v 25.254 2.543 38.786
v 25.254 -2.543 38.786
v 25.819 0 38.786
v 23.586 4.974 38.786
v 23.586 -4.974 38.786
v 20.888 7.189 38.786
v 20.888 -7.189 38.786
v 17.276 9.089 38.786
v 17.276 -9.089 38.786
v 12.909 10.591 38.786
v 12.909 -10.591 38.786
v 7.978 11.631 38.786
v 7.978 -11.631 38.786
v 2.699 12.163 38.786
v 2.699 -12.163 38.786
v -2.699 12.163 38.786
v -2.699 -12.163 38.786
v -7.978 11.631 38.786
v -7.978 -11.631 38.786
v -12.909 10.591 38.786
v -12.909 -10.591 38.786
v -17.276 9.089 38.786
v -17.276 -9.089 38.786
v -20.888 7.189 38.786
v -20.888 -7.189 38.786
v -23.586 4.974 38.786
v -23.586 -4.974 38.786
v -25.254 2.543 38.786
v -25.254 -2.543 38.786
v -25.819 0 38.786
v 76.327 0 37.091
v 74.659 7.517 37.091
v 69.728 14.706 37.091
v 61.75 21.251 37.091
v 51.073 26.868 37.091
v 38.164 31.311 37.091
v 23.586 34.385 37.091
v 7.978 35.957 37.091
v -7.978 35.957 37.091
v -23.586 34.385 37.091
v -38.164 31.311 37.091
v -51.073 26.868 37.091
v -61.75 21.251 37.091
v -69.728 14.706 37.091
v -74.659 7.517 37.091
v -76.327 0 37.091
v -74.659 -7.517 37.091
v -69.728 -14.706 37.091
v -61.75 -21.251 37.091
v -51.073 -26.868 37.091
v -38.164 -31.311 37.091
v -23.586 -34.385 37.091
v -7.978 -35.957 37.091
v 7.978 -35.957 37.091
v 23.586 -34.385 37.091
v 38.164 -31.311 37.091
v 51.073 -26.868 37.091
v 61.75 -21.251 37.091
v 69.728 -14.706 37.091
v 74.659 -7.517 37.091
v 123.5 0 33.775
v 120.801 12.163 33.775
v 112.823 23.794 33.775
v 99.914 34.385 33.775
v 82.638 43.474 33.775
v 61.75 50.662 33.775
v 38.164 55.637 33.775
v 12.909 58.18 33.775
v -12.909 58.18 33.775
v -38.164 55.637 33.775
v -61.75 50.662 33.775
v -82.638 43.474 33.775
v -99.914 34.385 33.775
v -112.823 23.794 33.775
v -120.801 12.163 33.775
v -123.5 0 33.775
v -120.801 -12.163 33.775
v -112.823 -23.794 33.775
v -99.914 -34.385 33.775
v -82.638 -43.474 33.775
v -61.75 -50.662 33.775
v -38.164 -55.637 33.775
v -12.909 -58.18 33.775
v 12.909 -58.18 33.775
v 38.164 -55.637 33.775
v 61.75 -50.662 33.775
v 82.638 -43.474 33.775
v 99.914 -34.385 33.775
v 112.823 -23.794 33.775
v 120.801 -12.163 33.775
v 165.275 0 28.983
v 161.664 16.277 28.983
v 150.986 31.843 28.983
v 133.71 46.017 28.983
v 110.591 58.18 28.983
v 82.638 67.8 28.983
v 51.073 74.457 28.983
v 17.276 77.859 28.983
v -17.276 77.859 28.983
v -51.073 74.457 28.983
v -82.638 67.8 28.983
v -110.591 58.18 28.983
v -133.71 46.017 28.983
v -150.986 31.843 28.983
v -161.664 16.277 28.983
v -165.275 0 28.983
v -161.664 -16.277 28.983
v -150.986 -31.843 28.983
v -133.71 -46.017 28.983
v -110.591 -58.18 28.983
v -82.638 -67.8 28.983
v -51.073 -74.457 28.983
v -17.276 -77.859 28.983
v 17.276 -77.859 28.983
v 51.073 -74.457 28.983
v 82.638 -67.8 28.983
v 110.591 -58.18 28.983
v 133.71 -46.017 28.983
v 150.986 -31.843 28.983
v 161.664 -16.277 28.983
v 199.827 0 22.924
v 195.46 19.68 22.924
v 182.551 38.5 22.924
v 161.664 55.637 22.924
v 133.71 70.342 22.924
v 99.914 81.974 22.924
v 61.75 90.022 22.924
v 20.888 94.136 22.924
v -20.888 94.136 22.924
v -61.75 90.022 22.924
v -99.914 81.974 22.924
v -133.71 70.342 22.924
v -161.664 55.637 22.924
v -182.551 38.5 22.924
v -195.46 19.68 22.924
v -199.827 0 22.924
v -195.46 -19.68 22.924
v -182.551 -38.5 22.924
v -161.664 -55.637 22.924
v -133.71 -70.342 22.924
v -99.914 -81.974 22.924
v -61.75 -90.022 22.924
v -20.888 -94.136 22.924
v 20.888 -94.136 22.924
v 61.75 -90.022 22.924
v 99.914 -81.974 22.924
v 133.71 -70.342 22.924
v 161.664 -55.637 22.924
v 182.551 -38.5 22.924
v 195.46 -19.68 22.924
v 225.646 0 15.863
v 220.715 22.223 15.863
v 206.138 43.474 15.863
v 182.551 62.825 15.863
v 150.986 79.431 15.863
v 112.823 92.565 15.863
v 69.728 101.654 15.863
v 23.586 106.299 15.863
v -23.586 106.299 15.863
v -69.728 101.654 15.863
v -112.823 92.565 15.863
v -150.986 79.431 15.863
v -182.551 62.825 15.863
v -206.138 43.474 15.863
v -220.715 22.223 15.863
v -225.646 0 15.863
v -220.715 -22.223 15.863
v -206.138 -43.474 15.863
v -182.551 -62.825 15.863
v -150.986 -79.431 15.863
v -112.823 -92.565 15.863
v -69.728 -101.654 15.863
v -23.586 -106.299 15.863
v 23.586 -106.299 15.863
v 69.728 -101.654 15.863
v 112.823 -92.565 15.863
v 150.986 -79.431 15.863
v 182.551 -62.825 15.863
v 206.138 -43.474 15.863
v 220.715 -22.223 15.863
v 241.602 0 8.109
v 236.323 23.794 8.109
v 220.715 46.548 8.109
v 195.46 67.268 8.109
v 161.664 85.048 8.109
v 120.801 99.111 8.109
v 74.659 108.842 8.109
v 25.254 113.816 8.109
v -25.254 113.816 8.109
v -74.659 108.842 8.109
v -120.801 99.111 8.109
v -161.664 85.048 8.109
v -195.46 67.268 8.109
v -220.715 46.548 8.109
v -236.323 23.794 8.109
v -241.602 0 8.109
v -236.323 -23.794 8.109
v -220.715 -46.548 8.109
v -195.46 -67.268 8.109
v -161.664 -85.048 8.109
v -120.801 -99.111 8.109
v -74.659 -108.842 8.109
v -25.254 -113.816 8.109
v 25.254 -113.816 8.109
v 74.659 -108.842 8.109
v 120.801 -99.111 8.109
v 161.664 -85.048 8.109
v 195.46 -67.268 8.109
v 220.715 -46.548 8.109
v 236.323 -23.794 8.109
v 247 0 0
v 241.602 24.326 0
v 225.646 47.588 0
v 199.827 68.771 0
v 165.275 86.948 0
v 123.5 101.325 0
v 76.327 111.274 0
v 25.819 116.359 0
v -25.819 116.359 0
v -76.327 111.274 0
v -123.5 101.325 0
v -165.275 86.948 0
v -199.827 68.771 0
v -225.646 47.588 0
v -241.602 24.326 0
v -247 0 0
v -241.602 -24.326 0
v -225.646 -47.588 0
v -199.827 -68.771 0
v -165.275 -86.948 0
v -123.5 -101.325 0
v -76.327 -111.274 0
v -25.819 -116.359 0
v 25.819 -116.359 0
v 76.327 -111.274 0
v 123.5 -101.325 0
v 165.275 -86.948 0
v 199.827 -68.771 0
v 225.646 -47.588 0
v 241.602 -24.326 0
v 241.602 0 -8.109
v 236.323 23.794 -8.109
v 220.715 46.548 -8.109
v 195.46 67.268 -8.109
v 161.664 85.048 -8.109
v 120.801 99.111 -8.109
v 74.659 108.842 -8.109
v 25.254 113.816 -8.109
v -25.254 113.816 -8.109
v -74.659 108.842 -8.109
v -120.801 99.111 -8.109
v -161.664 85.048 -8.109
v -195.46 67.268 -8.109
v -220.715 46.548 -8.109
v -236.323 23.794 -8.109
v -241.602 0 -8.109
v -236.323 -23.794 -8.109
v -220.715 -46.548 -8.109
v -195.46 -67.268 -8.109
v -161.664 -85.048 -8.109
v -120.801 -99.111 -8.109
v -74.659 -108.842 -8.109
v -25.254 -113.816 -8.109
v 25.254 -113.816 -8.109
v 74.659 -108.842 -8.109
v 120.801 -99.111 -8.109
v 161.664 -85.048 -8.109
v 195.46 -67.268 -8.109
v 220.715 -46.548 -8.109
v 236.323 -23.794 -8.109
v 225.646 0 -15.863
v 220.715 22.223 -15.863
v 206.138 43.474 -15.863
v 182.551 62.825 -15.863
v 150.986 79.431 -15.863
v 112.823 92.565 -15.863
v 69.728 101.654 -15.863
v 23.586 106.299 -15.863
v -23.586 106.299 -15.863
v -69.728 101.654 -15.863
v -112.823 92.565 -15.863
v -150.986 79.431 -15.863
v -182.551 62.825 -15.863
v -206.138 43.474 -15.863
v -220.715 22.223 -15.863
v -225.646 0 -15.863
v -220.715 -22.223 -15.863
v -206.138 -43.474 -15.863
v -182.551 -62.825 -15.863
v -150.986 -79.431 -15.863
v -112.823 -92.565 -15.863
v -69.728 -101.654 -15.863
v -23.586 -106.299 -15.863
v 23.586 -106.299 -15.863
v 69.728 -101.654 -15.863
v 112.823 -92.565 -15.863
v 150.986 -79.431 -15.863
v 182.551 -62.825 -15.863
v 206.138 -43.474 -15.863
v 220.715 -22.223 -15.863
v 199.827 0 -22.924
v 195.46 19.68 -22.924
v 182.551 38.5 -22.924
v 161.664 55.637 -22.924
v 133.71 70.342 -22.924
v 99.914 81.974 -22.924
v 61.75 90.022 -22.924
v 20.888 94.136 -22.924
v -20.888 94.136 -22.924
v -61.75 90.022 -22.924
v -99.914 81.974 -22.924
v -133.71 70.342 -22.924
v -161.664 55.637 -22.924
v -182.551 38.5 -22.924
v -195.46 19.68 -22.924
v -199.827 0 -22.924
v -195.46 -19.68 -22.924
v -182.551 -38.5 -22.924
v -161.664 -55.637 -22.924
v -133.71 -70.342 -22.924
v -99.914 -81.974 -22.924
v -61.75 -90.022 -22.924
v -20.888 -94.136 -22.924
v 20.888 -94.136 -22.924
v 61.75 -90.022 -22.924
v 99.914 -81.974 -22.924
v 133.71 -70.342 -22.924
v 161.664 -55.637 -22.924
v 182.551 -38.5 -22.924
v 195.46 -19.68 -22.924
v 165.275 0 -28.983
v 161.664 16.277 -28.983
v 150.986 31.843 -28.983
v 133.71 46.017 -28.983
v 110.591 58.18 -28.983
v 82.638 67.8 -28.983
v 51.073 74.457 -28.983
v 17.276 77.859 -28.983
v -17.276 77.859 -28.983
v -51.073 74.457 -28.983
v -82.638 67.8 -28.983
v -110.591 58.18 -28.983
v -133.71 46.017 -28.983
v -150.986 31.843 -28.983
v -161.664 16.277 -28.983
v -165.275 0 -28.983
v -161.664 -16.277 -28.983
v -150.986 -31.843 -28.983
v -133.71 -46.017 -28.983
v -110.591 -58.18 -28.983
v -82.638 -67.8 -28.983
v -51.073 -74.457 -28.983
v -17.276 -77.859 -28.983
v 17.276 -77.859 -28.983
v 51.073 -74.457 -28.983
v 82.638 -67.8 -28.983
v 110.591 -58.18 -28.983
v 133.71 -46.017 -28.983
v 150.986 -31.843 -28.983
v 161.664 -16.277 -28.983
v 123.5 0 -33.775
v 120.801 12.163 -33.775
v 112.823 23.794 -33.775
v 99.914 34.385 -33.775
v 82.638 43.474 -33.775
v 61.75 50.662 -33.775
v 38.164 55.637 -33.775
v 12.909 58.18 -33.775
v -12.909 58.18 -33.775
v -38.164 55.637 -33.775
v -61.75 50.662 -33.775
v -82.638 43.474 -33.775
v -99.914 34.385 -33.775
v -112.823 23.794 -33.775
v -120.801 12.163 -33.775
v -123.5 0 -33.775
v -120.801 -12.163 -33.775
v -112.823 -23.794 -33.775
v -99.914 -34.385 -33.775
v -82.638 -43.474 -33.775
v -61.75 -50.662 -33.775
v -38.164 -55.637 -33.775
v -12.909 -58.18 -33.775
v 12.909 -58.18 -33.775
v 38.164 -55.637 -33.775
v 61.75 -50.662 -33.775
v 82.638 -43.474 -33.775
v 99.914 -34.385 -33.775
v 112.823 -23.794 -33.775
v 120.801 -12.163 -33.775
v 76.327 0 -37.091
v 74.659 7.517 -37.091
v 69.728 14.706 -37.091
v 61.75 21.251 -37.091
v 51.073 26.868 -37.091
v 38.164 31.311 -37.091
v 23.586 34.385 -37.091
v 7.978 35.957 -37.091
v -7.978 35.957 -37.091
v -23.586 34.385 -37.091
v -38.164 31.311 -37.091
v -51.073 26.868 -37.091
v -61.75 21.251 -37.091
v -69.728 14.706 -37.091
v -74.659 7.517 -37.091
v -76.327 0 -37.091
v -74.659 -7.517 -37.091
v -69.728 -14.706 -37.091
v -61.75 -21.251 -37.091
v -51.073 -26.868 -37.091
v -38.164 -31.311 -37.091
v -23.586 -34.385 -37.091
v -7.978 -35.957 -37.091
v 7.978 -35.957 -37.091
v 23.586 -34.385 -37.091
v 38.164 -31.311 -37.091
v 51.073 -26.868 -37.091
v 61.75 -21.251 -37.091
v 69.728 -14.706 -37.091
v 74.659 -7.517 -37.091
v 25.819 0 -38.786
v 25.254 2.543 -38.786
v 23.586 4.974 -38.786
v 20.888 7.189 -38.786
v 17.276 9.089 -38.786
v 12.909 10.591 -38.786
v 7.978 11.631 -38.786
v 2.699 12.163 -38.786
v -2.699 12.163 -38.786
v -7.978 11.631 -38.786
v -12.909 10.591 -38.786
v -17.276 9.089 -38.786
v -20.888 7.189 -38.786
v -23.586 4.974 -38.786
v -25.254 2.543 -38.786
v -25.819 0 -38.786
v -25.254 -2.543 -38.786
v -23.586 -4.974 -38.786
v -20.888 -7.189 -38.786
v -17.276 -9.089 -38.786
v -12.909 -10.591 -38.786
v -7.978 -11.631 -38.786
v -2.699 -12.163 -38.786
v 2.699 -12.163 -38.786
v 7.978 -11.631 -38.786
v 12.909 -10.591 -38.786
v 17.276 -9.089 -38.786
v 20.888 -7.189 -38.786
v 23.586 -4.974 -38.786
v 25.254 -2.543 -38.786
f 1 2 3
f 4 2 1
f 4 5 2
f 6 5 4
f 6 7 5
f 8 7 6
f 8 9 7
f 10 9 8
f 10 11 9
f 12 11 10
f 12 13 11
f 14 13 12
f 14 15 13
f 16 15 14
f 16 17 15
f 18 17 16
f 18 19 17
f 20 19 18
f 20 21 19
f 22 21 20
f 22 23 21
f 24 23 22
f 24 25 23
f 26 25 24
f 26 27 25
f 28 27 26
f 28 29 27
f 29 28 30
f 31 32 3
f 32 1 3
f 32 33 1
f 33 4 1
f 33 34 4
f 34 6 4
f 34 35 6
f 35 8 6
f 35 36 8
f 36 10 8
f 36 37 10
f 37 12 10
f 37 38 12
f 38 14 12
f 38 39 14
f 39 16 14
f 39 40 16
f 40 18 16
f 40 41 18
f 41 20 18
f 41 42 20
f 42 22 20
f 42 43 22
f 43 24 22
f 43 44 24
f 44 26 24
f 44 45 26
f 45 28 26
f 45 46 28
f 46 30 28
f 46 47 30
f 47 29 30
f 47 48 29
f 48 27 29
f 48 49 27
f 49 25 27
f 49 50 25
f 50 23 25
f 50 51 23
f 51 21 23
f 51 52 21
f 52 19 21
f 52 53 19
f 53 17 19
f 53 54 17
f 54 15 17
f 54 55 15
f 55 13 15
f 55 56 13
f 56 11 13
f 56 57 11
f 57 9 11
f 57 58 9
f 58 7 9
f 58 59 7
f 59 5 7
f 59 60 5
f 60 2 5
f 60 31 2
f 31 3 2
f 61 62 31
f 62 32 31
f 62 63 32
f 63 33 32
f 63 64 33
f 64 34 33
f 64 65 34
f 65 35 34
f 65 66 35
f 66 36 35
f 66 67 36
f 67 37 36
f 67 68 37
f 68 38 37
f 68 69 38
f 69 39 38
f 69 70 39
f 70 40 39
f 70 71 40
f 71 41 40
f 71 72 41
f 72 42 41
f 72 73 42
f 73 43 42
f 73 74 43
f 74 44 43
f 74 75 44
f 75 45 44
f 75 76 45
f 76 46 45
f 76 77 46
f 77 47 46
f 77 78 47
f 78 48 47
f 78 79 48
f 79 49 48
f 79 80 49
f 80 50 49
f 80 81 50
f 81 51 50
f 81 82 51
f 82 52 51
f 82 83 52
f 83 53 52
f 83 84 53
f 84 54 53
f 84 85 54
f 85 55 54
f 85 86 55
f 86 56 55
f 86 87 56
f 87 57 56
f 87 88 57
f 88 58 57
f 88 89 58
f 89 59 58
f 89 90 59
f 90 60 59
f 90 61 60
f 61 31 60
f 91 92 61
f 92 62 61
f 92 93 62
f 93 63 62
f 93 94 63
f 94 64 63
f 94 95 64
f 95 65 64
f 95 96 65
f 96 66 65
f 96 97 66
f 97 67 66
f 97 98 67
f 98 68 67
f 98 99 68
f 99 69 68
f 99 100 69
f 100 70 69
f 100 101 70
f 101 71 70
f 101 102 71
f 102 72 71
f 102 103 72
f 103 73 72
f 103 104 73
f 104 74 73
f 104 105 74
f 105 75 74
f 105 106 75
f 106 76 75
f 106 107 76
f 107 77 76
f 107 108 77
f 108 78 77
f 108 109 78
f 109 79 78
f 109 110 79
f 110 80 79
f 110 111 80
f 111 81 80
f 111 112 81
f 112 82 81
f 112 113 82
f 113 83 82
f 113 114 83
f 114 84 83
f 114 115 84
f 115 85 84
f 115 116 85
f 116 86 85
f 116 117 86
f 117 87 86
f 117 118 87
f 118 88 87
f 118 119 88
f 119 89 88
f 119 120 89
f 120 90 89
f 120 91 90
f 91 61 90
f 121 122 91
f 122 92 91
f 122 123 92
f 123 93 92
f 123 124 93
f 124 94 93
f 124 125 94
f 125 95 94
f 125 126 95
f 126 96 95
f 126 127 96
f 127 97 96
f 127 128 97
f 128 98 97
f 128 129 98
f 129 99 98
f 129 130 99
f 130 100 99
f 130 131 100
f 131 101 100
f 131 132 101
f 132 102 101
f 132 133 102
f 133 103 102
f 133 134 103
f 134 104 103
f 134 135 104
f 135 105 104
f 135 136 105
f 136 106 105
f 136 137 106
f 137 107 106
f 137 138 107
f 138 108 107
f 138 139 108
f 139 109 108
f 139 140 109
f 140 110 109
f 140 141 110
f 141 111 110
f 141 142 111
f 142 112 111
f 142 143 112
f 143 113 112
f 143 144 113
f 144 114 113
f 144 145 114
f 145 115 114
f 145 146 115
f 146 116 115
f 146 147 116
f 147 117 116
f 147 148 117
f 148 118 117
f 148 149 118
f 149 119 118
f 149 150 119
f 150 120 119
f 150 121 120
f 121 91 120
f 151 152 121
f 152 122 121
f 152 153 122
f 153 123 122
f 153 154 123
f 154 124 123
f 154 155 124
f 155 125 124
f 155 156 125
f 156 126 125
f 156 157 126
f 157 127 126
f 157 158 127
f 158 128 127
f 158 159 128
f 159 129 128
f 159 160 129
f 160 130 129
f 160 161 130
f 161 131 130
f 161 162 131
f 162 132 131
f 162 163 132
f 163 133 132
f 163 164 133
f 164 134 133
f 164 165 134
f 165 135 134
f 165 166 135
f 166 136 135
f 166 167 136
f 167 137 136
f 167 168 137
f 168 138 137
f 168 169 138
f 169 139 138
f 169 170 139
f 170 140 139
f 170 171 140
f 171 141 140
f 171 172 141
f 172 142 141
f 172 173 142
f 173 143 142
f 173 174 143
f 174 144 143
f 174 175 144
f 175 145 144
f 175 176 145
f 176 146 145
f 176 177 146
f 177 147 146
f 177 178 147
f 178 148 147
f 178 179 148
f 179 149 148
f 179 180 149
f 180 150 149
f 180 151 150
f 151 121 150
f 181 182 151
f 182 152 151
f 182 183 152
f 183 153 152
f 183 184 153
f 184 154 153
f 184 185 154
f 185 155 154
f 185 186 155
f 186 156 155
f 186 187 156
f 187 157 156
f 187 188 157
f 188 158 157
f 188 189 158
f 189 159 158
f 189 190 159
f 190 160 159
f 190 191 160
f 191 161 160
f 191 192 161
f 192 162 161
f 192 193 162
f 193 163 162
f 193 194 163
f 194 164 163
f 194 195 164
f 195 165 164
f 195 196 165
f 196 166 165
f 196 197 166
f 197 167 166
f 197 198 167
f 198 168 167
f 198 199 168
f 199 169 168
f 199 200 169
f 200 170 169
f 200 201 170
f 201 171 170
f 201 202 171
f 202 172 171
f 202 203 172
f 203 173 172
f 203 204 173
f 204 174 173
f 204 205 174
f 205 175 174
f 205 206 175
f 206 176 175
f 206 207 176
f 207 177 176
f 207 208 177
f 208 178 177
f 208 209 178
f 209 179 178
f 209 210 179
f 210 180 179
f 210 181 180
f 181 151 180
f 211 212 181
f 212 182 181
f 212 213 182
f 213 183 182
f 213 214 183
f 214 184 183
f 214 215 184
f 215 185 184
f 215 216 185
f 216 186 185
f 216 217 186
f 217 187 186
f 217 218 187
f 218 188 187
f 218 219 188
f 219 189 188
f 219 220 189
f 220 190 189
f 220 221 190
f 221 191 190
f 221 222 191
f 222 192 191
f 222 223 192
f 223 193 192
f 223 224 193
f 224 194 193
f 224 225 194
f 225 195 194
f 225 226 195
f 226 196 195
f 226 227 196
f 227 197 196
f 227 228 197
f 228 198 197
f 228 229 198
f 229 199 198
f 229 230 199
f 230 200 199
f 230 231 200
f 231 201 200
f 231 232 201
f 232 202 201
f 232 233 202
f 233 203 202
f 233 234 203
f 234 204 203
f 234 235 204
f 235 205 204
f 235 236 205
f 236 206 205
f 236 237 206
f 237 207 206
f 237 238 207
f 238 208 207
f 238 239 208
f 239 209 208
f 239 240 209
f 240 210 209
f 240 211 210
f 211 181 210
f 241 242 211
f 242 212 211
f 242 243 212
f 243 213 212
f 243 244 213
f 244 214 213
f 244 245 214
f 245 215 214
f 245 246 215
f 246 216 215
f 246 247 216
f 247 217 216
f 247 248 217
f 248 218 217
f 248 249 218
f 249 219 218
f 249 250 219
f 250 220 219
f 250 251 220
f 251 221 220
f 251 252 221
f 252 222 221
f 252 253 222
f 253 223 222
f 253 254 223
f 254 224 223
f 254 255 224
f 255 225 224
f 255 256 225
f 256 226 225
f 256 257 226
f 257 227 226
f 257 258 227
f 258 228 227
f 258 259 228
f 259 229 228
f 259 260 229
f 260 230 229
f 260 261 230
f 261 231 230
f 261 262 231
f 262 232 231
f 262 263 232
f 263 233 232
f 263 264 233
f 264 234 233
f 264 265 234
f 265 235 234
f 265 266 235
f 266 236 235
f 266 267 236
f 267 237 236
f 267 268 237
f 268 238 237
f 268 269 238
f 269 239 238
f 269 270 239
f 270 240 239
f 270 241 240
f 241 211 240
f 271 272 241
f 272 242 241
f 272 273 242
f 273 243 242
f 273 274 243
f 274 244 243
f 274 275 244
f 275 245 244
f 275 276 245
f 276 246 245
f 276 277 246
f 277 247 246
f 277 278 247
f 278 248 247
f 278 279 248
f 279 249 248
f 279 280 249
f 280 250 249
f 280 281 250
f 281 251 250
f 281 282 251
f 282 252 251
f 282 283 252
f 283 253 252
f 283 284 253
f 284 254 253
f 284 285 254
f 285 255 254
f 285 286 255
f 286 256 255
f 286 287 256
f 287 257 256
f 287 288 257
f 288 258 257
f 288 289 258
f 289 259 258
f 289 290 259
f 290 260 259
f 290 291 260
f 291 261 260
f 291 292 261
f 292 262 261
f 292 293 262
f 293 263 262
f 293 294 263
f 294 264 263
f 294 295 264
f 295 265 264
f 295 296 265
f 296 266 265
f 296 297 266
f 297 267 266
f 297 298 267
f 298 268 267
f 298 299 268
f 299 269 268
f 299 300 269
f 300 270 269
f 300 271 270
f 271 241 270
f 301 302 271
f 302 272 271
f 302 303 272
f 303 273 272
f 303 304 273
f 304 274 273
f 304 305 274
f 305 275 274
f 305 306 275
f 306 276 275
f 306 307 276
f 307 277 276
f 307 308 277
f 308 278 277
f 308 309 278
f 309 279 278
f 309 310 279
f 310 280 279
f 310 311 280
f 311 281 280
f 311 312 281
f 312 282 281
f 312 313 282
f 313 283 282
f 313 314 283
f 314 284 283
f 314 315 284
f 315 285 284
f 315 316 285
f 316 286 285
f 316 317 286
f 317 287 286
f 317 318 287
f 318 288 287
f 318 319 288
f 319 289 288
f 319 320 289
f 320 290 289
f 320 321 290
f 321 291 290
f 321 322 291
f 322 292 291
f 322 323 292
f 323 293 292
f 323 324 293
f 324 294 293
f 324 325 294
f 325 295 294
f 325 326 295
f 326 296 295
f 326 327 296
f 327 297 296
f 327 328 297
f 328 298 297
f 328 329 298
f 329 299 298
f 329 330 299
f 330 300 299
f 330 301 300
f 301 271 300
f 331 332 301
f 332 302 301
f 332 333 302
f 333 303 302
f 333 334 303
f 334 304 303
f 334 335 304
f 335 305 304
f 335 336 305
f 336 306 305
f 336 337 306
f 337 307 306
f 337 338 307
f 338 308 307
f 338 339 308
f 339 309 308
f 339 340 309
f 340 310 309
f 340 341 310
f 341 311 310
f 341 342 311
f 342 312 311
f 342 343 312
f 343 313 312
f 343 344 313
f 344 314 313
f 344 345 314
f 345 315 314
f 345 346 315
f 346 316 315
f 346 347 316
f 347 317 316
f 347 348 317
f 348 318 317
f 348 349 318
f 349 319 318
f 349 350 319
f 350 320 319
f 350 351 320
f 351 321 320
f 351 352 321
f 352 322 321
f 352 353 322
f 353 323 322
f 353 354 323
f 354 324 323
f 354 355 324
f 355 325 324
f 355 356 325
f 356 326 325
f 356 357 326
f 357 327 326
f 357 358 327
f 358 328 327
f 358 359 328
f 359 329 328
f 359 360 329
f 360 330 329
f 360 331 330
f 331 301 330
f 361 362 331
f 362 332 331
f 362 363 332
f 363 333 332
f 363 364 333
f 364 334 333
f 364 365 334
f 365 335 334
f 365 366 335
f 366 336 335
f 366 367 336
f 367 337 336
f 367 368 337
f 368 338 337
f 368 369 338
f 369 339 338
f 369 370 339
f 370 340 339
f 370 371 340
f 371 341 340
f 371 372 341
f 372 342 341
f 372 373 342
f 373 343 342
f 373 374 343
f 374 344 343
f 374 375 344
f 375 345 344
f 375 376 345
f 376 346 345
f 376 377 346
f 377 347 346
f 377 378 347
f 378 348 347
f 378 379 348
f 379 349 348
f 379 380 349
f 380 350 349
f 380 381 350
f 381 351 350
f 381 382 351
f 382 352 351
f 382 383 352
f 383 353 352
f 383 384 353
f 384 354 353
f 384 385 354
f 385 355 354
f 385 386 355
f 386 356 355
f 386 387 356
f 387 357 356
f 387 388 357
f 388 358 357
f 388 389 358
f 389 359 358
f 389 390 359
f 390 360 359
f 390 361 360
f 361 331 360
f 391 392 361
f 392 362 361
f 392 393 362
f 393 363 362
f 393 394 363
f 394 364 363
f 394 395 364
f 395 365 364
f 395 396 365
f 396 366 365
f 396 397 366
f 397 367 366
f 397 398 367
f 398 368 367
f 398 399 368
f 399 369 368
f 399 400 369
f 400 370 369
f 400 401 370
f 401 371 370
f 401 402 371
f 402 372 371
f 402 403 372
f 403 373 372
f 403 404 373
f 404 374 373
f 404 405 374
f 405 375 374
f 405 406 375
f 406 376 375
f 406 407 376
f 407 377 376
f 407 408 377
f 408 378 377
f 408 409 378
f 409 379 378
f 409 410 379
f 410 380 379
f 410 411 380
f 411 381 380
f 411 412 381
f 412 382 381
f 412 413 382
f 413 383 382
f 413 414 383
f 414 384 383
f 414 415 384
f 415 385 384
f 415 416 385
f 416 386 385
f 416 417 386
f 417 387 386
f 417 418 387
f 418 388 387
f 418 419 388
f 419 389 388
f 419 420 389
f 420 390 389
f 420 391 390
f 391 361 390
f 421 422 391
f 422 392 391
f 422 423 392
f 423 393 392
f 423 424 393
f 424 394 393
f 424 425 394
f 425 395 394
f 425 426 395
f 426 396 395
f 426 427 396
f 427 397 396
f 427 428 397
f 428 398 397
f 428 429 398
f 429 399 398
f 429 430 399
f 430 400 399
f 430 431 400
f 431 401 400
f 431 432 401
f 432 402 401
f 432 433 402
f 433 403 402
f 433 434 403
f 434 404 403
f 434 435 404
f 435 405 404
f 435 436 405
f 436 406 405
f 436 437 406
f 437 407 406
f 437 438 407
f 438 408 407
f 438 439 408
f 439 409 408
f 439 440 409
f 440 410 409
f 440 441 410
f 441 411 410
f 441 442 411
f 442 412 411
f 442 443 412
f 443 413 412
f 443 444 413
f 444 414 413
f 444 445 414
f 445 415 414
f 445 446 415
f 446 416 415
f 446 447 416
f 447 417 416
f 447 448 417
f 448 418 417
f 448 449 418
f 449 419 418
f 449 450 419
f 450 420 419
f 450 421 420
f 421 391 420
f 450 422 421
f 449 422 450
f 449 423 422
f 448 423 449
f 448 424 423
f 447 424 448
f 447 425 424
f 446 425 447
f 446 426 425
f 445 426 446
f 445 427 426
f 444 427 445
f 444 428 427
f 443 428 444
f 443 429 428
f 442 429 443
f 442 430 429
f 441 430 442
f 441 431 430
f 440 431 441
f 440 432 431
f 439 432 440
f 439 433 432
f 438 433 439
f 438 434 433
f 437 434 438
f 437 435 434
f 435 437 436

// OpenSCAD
// Generated by SolidPython 1.0.1 on 2020-07-29 00:46:53


scale(v = [19, 9, 3]) {
	sphere(r = 13);
}
/***********************************************
*********      SolidPython code:      **********
************************************************
 
# import packages: SolidPython
from solid import *
from solid.utils import *
from itertools import chain, combinations, permutations


class Resize:

    def __init__(self, scad_file):
        self.scad_file = scad_file
        #self.scad_file = import_scad(scad_file)
        # cone/cylinder param:
        self.r1 = 0
        self.r2 = 0
        self.h = 0
        # rectangular prism param:
        self.w = 0
        self.l = 0
        # ellipse param:
        self.r = 0

    # import OpenScad code (file name corresponds to shape)


    # classify shape + parameters
    def assign(self, param1, param2, param3):
        if self.scad_file == 'cone.scad':
            self.r1 = param1
            self.r2 = param2
            self.h = param3
        elif self.scad_file == 'cylinder.scad':
            self.r1 = param1
            self.r2 = param2
            self.h = param3
        elif self.scad_file == 'rectangularPrism.scad':
            self.h = param1
            self.l = param2
            self.w = param3
        else:
            self.r = param1
            self.h = param2

    # resize parameters
    def iterate(self):
        x = range(3, 20, 2)
        i = 1
        if self.scad_file == 'cone.scad':
            tempList = list(permutations(x, 2))
            for temp in tempList:
                param1 = temp[0]
                param2 = temp[1]
                filepath = 'produced_scad_files/' + 'cone' + str(param1) + '_' + str(param2) + '_' + '.scad'
                scad_render_to_file(cylinder(h=param1, r1=param2, r2=0), filepath)

        elif self.scad_file == 'cylinder.scad':
            tempList = list(permutations(x, 3))
            for temp in tempList:
                param1 = temp[0]
                param2 = temp[1]
                filepath = 'produced_scad_files/' + 'cylinder' + str(param1) + '_' + str(param2) + '_' + '.scad'
                scad_render_to_file(cylinder(h=param1, r1=param2, r2=param2), filepath)

        elif self.scad_file == 'rectangularPrism.scad':
            tempList = list(permutations(x, 3))
            for temp in tempList:
                param1 = temp[0]
                param2 = temp[1]
                param3 = temp[2]
                filepath = 'produced_scad_files/' + 'rectangularPrism' + str(param1) + '_' + str(param2) + '_' + str(
                    param3) + '.scad'
                scad_render_to_file(cube(size=(param1, param2, param3)), filepath)

        elif self.scad_file == 'ellipse.scad':
            tempList = list(permutations(x, 4))
            for temp in tempList:
                param1 = temp[0]
                param2 = temp[1]
                param3 = temp[2]
                param4 = temp[3]
                filepath = 'produced_scad_files/' + 'ellipse' + str(param1) + '_' + str(param2) + '_' + str(param3) + '_' + str(param4) + '.scad'
                scad_render_to_file(scale([param1, param2, param3])(sphere(r=param4)), filepath)

    def render_to_scadfile(self):
        scad_render_to_file(scad, 'example.scad') 
 
************************************************/
